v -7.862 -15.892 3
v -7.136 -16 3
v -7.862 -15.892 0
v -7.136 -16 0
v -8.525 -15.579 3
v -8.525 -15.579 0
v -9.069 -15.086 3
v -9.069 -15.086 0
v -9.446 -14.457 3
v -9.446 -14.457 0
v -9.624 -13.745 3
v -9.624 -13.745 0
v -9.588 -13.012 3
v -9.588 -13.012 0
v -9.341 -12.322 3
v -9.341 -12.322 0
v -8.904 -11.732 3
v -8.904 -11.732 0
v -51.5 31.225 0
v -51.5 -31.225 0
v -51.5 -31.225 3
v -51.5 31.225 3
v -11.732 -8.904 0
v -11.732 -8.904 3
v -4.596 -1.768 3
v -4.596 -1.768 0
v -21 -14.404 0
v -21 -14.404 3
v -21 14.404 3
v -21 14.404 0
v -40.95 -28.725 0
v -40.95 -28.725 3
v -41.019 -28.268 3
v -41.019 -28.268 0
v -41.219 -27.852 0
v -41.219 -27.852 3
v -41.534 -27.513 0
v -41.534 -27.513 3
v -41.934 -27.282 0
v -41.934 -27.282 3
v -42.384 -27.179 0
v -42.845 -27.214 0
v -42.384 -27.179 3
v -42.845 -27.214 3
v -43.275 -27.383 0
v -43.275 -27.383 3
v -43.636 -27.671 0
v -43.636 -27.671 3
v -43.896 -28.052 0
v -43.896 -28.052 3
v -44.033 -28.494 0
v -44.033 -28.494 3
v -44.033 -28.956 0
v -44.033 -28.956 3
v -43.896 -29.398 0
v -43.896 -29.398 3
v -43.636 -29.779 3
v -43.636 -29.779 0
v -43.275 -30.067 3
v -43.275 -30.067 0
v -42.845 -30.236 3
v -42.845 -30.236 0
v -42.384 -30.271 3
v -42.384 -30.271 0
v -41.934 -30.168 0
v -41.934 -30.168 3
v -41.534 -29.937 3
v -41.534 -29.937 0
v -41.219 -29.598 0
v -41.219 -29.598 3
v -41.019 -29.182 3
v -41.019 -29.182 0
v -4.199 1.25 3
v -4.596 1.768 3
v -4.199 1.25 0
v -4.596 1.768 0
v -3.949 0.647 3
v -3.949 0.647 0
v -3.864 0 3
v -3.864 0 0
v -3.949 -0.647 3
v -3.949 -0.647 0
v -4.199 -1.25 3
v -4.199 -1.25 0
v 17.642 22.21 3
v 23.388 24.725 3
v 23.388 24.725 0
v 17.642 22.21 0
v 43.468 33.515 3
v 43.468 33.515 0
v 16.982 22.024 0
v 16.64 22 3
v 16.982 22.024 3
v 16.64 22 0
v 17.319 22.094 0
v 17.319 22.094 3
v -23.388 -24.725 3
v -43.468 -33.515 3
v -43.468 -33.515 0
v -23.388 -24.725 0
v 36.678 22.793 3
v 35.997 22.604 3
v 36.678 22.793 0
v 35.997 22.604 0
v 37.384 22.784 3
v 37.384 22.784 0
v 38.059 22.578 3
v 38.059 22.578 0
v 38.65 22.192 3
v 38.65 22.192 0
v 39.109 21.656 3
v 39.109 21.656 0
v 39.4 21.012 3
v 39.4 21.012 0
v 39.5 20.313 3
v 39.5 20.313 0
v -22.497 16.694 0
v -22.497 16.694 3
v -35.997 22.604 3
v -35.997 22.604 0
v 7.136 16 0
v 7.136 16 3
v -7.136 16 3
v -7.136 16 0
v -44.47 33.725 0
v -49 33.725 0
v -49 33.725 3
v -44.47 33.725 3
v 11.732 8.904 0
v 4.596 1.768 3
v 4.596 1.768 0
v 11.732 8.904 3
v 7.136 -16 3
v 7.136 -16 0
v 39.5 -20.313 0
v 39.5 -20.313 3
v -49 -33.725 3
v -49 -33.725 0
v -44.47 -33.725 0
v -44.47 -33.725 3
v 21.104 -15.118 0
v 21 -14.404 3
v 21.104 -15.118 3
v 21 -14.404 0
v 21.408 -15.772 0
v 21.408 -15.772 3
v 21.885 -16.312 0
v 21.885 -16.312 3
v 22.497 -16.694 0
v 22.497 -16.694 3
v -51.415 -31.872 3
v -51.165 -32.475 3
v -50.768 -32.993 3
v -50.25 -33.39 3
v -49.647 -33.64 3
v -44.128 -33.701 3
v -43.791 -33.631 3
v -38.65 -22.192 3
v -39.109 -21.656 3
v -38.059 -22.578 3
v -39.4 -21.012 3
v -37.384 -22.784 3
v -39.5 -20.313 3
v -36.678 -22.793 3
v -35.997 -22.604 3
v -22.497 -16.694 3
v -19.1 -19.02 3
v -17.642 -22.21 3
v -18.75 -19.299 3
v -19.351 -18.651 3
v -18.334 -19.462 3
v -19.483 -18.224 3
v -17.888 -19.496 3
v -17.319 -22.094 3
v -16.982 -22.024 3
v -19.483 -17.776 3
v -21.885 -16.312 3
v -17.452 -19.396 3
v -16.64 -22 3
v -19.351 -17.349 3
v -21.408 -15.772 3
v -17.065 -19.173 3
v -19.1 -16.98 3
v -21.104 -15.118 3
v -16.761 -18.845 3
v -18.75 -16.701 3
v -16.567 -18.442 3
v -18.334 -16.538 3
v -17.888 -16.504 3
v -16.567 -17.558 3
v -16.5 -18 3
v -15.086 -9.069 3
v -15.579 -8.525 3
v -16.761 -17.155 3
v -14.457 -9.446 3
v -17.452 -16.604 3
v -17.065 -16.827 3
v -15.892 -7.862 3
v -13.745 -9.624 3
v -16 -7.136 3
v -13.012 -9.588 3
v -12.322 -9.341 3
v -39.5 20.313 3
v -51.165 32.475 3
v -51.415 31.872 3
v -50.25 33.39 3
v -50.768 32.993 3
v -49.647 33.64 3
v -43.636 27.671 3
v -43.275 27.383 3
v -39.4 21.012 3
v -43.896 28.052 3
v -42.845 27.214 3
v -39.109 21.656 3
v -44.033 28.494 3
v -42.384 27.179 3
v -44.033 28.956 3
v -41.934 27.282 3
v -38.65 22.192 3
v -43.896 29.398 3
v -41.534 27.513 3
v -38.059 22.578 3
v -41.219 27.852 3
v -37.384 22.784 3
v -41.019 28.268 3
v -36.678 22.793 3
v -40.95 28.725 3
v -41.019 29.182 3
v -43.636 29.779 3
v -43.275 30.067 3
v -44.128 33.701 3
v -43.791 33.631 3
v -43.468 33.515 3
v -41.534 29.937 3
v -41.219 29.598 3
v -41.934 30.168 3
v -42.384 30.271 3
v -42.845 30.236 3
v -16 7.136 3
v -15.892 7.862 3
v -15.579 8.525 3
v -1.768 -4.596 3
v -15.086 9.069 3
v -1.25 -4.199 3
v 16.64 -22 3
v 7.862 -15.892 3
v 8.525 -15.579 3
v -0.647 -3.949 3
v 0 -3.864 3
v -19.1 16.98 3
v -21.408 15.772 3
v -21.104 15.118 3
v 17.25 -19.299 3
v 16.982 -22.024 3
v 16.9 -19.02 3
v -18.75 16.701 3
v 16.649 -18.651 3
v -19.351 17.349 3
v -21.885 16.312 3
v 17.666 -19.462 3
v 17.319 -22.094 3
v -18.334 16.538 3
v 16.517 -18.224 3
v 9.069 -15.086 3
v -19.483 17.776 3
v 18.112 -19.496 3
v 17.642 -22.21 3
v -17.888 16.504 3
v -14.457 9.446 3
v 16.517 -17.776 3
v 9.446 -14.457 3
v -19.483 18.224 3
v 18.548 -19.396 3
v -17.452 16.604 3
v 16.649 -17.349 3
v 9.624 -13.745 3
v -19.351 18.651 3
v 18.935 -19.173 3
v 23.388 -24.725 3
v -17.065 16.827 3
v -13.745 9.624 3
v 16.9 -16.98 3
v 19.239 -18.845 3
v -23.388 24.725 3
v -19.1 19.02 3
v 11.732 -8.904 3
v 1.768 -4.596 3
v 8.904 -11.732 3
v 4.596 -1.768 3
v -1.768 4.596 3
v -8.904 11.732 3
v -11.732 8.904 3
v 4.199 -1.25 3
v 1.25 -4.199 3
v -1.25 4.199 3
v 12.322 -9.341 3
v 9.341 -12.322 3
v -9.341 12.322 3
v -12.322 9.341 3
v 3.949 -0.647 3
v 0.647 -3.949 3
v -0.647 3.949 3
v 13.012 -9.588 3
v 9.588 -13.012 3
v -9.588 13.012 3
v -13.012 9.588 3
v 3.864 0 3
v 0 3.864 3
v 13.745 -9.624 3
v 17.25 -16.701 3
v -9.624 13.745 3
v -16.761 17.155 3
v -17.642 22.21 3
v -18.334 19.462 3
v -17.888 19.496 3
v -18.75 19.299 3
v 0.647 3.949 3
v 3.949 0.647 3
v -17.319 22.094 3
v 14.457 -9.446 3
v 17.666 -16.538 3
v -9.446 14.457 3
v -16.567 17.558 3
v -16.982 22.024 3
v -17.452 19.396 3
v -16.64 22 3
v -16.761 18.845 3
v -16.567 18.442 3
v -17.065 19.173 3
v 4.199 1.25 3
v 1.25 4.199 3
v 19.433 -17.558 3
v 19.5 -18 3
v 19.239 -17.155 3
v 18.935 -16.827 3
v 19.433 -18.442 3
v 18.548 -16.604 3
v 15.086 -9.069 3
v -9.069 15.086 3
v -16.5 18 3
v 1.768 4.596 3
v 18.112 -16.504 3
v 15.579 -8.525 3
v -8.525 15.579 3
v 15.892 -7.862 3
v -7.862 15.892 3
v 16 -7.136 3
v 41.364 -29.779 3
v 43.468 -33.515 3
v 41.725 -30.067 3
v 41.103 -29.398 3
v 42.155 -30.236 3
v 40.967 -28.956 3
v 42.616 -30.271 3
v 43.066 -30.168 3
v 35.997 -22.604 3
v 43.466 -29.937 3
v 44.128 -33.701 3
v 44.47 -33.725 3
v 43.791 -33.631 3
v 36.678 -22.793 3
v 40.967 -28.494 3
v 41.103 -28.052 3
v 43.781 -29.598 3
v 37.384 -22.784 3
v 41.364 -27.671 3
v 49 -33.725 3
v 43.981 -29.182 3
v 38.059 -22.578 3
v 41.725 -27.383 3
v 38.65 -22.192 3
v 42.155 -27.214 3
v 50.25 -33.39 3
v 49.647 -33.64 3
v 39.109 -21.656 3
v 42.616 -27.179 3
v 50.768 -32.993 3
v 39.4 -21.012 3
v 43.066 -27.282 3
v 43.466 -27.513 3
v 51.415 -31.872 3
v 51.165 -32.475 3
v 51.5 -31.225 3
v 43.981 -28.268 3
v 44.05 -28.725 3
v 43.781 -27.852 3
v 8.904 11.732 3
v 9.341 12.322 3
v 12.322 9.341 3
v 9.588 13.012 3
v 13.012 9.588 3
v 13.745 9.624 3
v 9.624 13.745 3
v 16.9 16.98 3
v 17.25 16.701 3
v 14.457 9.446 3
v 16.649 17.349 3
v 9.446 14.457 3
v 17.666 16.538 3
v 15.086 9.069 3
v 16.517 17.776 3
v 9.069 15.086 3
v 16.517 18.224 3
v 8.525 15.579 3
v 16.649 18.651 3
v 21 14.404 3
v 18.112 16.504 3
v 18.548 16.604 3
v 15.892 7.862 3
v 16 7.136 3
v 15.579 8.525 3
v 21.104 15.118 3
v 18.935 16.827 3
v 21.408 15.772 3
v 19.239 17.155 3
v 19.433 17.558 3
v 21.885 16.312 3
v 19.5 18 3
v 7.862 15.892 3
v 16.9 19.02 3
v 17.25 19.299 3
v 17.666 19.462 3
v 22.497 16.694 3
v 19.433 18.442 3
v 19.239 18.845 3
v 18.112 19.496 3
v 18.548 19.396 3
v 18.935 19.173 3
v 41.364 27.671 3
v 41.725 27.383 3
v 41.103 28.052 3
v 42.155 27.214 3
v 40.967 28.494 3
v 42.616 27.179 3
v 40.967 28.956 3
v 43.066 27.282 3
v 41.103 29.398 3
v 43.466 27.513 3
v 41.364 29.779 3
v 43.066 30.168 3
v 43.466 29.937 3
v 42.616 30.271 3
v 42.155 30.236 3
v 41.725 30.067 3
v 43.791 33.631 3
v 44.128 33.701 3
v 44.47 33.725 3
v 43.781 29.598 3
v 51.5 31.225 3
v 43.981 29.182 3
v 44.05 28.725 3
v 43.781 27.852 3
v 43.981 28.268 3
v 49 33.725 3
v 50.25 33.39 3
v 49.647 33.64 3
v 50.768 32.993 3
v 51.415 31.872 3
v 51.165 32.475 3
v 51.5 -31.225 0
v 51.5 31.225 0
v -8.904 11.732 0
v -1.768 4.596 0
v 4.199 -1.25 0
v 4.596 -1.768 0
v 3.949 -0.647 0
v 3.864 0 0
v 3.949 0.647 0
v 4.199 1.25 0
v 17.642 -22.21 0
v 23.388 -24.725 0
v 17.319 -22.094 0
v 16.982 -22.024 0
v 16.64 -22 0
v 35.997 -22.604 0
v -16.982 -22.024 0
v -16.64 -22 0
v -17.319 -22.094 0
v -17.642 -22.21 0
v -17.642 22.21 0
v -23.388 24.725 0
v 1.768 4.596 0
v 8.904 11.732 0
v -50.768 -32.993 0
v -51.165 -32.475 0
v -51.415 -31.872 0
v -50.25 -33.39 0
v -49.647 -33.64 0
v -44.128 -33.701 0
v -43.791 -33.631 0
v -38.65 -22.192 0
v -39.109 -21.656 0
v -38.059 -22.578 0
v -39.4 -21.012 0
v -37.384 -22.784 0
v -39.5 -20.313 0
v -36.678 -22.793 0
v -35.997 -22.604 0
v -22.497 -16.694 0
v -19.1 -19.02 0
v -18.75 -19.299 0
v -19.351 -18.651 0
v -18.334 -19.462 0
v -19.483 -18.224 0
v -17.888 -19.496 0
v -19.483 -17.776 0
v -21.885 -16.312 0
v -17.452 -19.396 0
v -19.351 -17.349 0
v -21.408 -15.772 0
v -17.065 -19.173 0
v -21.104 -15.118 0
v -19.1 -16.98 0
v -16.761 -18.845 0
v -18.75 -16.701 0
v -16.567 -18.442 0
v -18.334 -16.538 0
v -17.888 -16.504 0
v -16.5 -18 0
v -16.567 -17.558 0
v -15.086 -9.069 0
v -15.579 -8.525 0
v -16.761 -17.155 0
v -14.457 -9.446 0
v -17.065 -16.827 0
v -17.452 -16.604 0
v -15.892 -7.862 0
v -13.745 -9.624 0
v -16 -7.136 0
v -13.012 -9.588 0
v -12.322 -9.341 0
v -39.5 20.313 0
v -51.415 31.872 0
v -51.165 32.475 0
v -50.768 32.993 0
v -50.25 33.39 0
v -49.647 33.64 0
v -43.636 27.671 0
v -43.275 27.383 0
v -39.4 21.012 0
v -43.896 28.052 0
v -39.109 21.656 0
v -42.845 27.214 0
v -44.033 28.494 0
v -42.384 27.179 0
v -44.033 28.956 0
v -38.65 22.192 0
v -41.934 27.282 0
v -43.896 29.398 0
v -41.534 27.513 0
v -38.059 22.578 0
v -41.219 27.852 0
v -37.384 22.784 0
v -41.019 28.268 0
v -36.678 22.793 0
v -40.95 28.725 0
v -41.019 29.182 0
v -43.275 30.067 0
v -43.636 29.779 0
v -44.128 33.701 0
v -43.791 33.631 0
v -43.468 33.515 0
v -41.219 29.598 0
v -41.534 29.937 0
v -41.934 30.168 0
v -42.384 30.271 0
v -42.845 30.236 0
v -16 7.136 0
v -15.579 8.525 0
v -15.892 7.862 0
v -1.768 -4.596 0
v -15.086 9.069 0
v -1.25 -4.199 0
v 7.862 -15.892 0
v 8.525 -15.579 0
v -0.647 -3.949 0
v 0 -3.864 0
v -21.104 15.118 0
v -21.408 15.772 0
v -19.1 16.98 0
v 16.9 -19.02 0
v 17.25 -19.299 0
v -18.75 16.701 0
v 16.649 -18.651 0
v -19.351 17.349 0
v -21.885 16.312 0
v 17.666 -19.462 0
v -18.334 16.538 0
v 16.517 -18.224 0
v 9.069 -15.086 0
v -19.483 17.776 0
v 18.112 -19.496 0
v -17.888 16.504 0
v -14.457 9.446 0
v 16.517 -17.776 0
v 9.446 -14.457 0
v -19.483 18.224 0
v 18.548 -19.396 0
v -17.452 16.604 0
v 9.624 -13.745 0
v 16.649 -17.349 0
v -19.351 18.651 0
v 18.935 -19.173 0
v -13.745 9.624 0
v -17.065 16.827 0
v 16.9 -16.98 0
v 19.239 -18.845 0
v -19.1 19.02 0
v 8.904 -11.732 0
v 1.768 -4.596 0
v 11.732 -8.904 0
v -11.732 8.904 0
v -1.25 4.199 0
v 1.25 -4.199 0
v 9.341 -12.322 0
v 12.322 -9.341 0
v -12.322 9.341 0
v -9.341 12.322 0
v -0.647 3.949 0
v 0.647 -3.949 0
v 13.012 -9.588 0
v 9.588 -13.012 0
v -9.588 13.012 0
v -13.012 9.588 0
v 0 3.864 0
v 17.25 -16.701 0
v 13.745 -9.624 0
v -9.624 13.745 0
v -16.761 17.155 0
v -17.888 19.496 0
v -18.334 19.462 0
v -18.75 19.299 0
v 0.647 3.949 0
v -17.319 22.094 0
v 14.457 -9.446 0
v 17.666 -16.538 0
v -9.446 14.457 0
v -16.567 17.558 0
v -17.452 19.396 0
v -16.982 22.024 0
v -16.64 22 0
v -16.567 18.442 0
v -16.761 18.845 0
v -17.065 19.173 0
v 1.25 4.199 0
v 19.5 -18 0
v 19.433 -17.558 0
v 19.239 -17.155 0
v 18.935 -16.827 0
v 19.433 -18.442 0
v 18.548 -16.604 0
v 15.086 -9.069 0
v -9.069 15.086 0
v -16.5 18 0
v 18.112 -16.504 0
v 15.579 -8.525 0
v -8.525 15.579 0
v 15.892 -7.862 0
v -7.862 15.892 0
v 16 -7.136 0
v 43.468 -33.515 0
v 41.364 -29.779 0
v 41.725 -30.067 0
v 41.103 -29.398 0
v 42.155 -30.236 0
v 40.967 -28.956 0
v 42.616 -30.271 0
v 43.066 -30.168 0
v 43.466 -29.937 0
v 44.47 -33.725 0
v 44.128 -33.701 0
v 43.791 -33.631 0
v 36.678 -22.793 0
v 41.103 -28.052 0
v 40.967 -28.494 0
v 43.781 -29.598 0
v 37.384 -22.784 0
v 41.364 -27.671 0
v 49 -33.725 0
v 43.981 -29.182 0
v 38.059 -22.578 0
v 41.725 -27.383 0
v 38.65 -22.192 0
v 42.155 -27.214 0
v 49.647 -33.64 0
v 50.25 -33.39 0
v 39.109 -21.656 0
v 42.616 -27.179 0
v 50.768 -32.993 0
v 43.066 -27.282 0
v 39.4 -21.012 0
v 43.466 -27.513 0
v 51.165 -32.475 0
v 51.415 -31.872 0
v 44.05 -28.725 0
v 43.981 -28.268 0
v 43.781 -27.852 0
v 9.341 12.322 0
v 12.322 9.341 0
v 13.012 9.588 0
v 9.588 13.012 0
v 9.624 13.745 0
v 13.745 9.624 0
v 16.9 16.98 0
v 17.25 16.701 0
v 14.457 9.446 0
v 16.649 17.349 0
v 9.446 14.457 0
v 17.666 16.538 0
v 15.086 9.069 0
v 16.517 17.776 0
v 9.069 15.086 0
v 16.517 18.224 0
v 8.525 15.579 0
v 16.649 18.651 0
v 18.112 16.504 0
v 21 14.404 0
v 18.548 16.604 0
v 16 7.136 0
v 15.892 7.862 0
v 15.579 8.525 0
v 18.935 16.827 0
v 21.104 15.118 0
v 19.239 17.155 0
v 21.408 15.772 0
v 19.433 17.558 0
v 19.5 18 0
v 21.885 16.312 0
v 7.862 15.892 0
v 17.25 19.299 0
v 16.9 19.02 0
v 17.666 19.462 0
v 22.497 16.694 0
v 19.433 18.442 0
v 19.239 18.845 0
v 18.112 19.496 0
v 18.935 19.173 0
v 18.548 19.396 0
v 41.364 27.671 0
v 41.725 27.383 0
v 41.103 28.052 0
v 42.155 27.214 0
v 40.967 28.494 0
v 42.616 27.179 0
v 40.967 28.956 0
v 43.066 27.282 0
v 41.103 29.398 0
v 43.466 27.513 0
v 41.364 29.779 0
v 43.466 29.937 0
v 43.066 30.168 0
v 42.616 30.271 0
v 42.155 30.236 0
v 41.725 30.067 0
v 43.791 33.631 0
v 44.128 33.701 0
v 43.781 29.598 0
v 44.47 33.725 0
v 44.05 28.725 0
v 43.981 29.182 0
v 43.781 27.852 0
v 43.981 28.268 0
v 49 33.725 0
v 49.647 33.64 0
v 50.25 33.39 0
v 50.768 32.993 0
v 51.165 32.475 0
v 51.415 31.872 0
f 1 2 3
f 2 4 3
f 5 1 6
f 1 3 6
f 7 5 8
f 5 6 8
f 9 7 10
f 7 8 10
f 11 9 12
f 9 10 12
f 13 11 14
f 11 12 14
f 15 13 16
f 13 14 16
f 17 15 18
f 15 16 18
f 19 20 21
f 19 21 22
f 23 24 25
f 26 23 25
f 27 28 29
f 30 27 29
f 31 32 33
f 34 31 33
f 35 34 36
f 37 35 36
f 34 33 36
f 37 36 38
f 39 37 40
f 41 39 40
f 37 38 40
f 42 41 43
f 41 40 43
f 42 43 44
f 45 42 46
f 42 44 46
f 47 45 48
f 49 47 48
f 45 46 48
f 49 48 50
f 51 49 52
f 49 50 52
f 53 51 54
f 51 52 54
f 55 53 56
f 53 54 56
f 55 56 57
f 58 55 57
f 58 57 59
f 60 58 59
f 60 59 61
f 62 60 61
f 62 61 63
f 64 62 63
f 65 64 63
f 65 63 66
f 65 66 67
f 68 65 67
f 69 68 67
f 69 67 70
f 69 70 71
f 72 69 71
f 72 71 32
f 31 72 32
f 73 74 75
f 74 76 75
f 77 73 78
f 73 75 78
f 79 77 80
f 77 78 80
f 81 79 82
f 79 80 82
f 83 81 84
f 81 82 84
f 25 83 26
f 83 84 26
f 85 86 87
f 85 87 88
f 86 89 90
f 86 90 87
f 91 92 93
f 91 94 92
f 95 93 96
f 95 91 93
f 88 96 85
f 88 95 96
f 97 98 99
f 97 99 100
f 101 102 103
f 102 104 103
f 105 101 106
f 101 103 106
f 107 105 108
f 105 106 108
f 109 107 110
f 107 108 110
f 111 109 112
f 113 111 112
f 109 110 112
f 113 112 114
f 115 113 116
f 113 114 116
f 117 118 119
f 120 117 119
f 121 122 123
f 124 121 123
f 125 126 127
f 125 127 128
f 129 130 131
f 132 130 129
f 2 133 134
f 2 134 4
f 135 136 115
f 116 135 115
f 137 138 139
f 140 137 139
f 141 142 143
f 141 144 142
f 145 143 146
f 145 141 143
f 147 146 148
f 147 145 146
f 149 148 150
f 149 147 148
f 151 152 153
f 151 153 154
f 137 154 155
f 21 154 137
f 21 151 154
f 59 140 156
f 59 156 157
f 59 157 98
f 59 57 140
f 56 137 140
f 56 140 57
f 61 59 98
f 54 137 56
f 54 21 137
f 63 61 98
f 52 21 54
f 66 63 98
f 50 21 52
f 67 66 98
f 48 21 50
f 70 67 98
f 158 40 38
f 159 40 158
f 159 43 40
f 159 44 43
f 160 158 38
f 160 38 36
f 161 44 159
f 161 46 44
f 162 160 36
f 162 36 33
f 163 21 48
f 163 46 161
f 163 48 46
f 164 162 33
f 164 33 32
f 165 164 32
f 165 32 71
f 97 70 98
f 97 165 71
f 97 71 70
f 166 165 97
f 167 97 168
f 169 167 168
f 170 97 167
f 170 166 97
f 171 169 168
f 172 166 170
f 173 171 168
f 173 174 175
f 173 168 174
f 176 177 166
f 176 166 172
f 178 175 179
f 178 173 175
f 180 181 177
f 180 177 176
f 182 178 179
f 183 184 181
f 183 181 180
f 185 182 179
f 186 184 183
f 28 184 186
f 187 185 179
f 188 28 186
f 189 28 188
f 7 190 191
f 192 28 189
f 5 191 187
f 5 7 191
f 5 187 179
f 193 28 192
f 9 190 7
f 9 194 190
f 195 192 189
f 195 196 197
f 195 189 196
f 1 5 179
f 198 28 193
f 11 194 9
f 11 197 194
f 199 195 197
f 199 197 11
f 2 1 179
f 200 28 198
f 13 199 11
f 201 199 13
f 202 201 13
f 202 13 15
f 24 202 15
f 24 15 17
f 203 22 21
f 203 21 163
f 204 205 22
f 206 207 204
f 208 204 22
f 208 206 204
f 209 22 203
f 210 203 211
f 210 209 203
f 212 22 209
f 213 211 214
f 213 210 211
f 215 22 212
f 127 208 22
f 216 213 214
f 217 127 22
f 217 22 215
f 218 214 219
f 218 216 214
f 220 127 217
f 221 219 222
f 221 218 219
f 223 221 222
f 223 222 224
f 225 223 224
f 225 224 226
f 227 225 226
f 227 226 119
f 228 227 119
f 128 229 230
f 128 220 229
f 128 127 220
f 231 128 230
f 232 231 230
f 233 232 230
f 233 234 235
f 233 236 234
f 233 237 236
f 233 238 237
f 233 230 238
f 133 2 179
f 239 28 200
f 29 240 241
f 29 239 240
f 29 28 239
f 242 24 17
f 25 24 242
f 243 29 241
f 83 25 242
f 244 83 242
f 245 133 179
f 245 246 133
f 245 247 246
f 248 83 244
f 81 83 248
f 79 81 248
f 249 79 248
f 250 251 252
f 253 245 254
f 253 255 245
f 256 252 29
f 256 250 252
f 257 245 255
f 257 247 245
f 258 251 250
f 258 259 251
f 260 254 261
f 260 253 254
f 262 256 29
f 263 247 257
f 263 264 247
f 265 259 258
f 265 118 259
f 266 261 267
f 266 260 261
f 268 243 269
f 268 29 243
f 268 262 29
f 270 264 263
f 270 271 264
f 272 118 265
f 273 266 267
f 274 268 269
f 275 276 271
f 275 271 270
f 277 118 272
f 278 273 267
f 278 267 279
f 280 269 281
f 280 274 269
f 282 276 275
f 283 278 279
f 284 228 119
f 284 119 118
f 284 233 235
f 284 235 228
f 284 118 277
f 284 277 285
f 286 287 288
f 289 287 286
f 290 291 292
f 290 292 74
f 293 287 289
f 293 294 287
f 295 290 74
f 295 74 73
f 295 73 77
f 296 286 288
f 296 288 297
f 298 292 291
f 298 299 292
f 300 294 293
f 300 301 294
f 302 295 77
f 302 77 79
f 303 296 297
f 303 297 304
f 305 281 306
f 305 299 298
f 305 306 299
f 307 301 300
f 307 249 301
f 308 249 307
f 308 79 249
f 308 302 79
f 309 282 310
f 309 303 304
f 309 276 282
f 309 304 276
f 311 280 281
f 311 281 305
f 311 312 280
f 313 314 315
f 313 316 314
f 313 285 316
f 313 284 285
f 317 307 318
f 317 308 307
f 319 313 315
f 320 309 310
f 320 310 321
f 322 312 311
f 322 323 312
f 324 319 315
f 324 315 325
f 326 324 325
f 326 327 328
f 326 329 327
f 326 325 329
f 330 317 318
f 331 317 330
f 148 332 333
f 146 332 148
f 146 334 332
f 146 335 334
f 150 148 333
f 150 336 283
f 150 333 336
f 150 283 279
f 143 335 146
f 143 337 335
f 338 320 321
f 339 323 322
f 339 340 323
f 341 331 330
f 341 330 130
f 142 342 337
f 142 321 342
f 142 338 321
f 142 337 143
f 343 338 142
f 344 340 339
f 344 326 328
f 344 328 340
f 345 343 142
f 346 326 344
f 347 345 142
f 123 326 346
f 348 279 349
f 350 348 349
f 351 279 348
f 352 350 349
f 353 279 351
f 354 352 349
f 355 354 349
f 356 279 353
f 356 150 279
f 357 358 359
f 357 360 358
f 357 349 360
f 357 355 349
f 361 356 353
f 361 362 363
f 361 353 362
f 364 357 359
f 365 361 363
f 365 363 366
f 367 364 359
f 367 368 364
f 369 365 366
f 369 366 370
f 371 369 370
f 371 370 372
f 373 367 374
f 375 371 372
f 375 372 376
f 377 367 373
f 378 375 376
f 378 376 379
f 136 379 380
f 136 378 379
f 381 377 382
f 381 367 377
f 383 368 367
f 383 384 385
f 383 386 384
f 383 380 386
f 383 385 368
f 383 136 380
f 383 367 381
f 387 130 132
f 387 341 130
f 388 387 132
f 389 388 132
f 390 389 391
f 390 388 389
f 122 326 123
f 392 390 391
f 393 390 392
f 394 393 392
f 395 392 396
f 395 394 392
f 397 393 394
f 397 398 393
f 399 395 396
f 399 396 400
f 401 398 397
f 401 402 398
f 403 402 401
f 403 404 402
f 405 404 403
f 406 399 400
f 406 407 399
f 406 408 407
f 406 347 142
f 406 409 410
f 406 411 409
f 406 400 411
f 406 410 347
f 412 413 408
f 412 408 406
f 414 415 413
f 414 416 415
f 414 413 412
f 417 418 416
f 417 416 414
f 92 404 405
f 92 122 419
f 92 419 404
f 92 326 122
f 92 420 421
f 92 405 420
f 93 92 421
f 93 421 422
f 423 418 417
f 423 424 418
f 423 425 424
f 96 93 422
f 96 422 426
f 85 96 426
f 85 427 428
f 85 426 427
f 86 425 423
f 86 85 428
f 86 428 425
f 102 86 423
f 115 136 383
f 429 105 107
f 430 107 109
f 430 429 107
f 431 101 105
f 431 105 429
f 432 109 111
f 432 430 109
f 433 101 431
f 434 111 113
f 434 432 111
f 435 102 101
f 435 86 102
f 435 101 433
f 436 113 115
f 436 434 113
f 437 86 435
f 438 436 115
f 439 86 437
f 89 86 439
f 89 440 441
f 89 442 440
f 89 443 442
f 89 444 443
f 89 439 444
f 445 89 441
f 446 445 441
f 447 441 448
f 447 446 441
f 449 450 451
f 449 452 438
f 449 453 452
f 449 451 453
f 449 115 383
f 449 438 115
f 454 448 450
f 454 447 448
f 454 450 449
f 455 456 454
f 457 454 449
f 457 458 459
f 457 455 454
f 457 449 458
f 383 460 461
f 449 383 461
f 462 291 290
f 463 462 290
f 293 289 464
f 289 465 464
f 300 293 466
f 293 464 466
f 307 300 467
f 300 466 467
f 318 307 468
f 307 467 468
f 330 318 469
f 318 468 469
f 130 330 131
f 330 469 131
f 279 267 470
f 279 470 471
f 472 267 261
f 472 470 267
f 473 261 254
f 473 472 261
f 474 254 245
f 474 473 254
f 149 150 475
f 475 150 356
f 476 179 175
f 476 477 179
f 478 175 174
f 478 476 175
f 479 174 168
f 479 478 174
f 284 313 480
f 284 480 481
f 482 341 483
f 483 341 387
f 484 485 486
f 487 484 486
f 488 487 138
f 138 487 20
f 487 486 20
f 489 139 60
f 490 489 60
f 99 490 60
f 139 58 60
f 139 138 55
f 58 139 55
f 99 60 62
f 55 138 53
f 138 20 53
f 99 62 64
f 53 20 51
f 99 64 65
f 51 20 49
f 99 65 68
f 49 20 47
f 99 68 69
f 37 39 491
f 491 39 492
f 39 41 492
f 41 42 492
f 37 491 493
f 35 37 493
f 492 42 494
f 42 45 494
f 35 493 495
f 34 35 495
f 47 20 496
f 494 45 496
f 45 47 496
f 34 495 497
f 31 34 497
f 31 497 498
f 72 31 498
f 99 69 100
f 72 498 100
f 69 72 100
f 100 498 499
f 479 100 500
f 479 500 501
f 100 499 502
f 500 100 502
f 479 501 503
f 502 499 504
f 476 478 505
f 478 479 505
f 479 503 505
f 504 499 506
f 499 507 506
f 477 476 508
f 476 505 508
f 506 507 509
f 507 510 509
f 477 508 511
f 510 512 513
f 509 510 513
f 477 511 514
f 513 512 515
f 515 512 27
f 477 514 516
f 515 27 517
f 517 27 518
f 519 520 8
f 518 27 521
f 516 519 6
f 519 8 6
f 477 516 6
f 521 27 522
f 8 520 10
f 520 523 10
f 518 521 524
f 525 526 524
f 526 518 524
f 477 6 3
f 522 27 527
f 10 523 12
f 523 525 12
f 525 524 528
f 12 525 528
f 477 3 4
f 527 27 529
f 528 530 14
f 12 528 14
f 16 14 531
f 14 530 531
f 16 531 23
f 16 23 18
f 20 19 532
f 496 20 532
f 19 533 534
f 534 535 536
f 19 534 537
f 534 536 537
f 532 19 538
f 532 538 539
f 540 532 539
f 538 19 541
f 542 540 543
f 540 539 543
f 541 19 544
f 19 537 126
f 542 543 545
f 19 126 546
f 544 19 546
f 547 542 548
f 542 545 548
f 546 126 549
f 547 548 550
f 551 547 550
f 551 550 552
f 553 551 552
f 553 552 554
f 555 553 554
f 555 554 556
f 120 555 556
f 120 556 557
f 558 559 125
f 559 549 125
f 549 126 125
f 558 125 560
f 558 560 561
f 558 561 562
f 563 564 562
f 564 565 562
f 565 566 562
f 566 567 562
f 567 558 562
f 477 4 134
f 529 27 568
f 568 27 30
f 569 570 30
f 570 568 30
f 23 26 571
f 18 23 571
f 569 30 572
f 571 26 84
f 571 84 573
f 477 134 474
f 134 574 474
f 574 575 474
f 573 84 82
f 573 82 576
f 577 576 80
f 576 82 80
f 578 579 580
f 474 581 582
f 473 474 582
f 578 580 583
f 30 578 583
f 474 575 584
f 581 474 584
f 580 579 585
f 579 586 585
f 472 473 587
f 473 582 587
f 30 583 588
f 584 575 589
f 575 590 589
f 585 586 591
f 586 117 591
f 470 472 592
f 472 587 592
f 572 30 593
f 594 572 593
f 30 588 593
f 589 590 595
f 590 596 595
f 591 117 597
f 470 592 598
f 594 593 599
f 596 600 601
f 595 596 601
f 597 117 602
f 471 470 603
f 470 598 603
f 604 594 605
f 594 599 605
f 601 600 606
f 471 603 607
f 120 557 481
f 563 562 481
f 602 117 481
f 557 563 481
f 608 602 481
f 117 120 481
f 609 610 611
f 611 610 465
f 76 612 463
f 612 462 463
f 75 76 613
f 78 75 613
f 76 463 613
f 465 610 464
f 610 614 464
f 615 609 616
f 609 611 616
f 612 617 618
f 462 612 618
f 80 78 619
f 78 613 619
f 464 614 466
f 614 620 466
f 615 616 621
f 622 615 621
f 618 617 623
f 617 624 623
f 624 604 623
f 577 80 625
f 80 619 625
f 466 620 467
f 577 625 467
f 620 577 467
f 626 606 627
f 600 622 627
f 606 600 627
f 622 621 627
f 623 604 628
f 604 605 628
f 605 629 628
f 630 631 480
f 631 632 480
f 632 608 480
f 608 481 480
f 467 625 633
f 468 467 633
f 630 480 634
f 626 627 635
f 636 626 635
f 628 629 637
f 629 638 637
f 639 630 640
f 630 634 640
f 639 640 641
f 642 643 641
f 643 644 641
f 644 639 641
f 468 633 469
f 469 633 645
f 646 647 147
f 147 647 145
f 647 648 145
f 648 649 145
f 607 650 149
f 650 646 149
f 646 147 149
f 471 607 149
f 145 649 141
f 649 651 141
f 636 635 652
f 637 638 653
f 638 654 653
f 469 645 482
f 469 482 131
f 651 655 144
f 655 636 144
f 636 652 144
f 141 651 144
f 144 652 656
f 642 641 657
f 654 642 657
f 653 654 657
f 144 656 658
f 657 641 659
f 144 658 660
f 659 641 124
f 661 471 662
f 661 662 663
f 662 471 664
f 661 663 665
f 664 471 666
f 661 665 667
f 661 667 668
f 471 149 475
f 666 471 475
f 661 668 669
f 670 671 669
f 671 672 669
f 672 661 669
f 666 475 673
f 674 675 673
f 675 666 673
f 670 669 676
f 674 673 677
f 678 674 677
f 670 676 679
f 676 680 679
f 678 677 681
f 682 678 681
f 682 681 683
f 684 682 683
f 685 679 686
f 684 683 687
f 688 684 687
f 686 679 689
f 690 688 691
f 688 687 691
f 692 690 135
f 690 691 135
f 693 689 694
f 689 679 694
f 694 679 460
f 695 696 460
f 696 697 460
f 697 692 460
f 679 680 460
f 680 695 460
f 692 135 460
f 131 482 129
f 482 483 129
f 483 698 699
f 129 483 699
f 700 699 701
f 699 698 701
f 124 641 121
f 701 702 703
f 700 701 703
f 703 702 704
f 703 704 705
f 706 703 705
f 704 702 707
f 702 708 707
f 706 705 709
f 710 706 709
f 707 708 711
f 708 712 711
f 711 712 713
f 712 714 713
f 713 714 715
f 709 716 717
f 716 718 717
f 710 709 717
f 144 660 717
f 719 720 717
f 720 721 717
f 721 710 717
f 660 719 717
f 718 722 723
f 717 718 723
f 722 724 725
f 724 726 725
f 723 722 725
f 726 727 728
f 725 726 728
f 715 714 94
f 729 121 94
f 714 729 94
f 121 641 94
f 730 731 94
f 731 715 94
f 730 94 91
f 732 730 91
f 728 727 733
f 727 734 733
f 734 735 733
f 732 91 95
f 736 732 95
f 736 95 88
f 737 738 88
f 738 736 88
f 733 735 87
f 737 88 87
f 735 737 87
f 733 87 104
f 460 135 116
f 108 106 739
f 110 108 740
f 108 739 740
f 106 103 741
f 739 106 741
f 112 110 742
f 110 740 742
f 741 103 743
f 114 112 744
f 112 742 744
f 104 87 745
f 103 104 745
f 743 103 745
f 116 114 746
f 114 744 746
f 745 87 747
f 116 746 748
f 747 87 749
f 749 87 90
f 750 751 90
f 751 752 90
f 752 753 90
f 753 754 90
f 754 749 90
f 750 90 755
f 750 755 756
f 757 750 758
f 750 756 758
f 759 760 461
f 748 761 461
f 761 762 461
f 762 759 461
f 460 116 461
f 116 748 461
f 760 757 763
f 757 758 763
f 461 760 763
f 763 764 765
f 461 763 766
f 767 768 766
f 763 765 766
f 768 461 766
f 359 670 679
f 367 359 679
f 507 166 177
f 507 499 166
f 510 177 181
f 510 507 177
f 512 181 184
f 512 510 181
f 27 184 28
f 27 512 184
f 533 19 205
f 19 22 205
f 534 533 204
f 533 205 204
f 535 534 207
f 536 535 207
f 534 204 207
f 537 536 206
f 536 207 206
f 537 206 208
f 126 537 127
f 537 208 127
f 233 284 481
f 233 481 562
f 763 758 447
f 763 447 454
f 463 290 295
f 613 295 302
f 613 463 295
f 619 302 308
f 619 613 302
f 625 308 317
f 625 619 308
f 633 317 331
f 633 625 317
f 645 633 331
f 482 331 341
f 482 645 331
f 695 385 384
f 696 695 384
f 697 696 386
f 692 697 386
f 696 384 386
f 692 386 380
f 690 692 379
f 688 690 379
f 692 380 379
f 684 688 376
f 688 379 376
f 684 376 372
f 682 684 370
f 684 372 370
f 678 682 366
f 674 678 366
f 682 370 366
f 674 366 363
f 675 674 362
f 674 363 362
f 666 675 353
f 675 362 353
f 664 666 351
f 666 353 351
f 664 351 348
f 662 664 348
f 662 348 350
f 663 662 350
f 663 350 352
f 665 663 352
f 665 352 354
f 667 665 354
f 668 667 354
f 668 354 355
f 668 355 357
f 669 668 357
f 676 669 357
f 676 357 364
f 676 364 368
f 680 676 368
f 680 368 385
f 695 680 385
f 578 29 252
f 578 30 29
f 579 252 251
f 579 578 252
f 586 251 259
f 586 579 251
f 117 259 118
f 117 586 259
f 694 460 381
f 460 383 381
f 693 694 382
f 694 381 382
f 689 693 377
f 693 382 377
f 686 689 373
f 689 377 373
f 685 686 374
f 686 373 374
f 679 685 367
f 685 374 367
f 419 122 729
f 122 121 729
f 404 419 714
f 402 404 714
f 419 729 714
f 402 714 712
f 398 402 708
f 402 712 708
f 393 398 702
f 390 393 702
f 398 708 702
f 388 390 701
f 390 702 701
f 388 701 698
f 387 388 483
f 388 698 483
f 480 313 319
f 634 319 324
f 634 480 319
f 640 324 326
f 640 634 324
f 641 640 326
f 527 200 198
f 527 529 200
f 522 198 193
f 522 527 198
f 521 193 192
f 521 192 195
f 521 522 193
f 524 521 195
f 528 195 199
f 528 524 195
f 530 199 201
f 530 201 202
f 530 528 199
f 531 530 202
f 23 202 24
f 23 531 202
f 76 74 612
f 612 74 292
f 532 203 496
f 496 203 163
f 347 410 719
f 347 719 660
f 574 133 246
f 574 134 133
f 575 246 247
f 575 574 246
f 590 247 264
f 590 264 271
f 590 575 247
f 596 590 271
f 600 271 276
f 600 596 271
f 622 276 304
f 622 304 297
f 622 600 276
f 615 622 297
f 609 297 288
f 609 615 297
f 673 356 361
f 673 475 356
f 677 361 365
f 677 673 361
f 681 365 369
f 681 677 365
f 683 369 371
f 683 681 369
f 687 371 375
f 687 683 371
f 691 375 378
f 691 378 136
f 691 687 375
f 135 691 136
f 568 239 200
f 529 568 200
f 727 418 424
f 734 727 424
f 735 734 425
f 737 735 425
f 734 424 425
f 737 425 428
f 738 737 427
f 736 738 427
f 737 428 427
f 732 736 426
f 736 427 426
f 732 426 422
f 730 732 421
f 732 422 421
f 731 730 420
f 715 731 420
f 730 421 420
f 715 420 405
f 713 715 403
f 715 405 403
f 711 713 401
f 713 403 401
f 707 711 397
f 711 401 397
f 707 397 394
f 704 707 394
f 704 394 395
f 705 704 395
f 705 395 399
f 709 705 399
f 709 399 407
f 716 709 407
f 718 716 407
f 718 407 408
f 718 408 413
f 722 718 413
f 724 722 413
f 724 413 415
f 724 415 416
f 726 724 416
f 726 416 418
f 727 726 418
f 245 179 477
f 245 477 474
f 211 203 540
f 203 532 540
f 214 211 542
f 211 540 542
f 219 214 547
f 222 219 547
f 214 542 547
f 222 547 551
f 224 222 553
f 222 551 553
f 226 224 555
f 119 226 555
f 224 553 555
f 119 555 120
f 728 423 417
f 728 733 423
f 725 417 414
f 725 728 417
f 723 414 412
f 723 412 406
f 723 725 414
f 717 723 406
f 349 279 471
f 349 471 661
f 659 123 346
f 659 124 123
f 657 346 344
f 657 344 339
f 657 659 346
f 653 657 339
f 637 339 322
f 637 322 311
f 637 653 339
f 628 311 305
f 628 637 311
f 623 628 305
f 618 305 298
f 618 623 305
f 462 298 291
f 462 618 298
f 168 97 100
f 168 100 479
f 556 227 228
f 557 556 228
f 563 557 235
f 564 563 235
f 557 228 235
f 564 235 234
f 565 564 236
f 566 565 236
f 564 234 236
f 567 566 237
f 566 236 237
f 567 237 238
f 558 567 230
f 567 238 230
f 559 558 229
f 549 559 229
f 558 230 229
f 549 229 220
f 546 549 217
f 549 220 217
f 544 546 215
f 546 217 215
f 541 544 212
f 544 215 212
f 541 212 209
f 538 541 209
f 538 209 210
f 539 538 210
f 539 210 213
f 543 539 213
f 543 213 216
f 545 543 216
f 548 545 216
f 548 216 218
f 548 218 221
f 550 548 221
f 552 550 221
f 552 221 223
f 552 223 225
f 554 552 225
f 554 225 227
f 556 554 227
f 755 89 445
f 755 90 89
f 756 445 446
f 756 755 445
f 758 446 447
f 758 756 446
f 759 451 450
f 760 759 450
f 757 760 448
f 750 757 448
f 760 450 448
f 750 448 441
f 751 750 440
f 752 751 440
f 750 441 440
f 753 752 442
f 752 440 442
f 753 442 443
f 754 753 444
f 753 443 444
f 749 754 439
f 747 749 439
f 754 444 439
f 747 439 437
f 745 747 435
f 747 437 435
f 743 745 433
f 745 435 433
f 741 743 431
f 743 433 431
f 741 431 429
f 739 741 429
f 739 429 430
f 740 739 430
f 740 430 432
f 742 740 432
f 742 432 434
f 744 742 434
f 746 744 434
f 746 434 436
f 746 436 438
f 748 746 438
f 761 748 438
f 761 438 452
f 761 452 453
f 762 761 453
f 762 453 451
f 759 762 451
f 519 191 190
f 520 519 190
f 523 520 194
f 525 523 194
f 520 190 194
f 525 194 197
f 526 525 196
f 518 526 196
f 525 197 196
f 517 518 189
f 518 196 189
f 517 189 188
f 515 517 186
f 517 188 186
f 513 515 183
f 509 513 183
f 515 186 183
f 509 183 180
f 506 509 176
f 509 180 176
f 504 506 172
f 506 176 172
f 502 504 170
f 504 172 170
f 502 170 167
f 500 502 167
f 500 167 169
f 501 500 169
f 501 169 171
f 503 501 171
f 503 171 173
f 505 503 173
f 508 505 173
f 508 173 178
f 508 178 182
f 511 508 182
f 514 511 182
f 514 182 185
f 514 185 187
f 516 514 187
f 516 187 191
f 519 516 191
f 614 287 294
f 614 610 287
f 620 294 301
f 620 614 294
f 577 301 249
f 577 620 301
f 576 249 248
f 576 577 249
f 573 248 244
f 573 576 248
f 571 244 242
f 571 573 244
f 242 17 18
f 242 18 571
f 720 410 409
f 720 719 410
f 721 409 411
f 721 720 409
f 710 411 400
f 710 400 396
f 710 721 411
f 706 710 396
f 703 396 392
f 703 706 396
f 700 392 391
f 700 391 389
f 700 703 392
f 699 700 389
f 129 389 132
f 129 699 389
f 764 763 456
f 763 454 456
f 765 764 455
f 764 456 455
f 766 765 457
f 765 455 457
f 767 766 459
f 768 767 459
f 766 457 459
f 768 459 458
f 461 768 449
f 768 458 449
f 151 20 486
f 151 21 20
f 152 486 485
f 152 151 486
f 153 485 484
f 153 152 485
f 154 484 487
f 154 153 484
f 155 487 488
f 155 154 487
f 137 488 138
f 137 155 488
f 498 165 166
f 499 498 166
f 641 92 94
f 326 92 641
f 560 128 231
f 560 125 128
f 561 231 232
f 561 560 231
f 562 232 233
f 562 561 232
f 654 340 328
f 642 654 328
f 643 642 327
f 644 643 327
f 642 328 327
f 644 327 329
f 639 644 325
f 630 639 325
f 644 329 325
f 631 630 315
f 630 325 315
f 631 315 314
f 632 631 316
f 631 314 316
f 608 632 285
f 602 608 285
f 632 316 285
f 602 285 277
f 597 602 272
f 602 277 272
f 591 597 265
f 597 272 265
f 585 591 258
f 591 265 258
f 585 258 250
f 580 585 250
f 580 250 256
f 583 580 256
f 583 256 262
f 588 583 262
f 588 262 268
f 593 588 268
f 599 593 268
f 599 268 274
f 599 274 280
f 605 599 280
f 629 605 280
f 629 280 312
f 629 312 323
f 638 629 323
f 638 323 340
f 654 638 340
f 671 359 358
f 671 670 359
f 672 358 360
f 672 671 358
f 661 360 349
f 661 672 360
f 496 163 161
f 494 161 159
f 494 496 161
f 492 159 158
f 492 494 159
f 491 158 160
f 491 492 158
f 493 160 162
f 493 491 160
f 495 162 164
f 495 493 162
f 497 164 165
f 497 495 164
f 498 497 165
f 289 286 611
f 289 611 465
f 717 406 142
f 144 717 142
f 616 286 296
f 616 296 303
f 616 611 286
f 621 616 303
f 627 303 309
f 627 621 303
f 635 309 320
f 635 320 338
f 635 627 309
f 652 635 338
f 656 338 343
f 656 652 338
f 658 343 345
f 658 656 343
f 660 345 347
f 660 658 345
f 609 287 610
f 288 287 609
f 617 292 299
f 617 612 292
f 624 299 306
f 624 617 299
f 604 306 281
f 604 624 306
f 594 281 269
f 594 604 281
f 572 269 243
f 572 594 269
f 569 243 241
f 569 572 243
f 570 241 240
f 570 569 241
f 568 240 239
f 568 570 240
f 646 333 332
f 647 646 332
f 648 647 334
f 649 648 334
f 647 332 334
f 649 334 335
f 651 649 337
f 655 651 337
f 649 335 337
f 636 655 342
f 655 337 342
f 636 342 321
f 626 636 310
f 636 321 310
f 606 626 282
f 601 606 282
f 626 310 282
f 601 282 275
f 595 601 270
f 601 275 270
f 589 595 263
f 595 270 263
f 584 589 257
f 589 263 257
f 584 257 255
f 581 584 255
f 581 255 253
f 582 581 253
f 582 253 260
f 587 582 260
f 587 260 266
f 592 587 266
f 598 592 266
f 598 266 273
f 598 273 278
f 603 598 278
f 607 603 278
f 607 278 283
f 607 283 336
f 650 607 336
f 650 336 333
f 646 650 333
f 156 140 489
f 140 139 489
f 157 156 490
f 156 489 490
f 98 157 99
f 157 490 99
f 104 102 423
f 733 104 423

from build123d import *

# Parameters (mm, degrees)
SKETCH_1_W          = 103
SKETCH_1_H          = 67.45
EXTRUDE_1_DEPTH     = 3
SKETCH_2_R          = 1.5
SKETCH_2_R_2        = 1.55
CUT_EXTRUDE_1_DEPTH = 10
CUT_EXTRUDE_2_DEPTH = 10
FILLET_2_R          = 2.5


with BuildPart() as part:
    # 草图1 → 凸台-拉伸1 (new body)
    with BuildSketch(Plane.XY):
        Rectangle(SKETCH_1_W, SKETCH_1_H)
    extrude(amount=EXTRUDE_1_DEPTH)

    # 草图2 → 切除-拉伸1 (cut)
    with BuildSketch(Plane.XY.offset(3)):
        with Locations((-18, 18)):
            Circle(SKETCH_2_R)
        with Locations((18, 18)):
            Circle(SKETCH_2_R)
        with Locations((18, -18)):
            Circle(SKETCH_2_R)
        with Locations((-18, -18)):
            Circle(SKETCH_2_R)
        with Locations((-42.499997562, 28.725)):
            Circle(SKETCH_2_R_2)
        with Locations((-42.499997562, -28.725)):
            Circle(SKETCH_2_R_2)
        with Locations((42.5, -28.725)):
            Circle(SKETCH_2_R_2)
        with Locations((42.5, 28.725)):
            Circle(SKETCH_2_R_2)
    extrude(amount=-CUT_EXTRUDE_1_DEPTH, mode=Mode.SUBTRACT)

    # 草图3 → 切除-拉伸2 (cut)
    with BuildSketch(Plane.XY.offset(3)):
        Polygon((-39.499997562, 24.136880962), (-39.499997562, -24.136880962), (-21, -16.038411836), (-21, 16.038411836), align=None)
        Polygon((-17.162839154, 22), (-23.38778026, 24.725), (-43.947218774, 33.725), (43.947221211, 33.725), (23.387782698, 24.725), (17.162841592, 22), align=None)
        Polygon((39.5, 24.136880962), (21, 16.038410769), (21, -16.038411758), (39.5, -24.136881145), align=None)
        Polygon((-23.38778026, -24.725), (-17.162839154, -22), (17.162839231, -22), (23.387780956, -24.725), (43.947221515, -33.725), (-43.947218774, -33.725), align=None)
        Polygon((-2.828427125, 0), (-16, 13.171572875), (-16, -13.171572875), align=None)
        Polygon((13.171572875, 16), (-13.171572875, 16), (0, 2.828427125), align=None)
        Polygon((2.828427125, 0), (16, 13.171572875), (16, -13.171572875), align=None)
        Polygon((-13.171572875, -16), (0, -2.828427125), (13.171572875, -16), align=None)
    extrude(amount=-CUT_EXTRUDE_2_DEPTH, mode=Mode.SUBTRACT)

    # 圆角2
    fillet_2_edges = [part.edges().sort_by_distance(p)[0] for p in [
        (17.162841592, 22, 1.5),
        (-17.162839154, 22, 1.5),
        (-43.947218774, 33.725, 1.5),
        (43.947221211, 33.725, 1.5),
        (39.5, 24.136880962, 1.5),
        (39.5, -24.136881145, 1.5),
        (21, -16.038411758, 1.5),
        (21, 16.038410769, 1.5),
        (13.171572875, -16, 1.5),
        (-13.171572875, -16, 1.5),
        (0, -2.828427125, 1.5),
        (13.171572875, 16, 1.5),
        (0, 2.828427125, 1.5),
        (-13.171572875, 16, 1.5),
        (16, -13.171572875, 1.5),
        (2.828427125, 0, 1.5),
        (16, 13.171572875, 1.5),
        (-39.499997562, 24.136880962, 1.5),
        (-21, 16.038411836, 1.5),
        (-21, -16.038411836, 1.5),
        (-39.499997562, -24.136880962, 1.5),
        (-51.5, 33.725, 1.5),
        (51.5, 33.725, 1.5),
        (51.5, -33.725, 1.5),
        (-51.5, -33.725, 1.5),
        (-2.828427125, 0, 1.5),
        (-16, -13.171572875, 1.5),
        (-16, 13.171572875, 1.5),
        (-43.947218774, -33.725, 1.5),
        (-17.162839154, -22, 1.5),
        (17.162839231, -22, 1.5),
        (43.947221515, -33.725, 1.5),
    ]]
    fillet(fillet_2_edges, radius=FILLET_2_R)


solid = part.part
